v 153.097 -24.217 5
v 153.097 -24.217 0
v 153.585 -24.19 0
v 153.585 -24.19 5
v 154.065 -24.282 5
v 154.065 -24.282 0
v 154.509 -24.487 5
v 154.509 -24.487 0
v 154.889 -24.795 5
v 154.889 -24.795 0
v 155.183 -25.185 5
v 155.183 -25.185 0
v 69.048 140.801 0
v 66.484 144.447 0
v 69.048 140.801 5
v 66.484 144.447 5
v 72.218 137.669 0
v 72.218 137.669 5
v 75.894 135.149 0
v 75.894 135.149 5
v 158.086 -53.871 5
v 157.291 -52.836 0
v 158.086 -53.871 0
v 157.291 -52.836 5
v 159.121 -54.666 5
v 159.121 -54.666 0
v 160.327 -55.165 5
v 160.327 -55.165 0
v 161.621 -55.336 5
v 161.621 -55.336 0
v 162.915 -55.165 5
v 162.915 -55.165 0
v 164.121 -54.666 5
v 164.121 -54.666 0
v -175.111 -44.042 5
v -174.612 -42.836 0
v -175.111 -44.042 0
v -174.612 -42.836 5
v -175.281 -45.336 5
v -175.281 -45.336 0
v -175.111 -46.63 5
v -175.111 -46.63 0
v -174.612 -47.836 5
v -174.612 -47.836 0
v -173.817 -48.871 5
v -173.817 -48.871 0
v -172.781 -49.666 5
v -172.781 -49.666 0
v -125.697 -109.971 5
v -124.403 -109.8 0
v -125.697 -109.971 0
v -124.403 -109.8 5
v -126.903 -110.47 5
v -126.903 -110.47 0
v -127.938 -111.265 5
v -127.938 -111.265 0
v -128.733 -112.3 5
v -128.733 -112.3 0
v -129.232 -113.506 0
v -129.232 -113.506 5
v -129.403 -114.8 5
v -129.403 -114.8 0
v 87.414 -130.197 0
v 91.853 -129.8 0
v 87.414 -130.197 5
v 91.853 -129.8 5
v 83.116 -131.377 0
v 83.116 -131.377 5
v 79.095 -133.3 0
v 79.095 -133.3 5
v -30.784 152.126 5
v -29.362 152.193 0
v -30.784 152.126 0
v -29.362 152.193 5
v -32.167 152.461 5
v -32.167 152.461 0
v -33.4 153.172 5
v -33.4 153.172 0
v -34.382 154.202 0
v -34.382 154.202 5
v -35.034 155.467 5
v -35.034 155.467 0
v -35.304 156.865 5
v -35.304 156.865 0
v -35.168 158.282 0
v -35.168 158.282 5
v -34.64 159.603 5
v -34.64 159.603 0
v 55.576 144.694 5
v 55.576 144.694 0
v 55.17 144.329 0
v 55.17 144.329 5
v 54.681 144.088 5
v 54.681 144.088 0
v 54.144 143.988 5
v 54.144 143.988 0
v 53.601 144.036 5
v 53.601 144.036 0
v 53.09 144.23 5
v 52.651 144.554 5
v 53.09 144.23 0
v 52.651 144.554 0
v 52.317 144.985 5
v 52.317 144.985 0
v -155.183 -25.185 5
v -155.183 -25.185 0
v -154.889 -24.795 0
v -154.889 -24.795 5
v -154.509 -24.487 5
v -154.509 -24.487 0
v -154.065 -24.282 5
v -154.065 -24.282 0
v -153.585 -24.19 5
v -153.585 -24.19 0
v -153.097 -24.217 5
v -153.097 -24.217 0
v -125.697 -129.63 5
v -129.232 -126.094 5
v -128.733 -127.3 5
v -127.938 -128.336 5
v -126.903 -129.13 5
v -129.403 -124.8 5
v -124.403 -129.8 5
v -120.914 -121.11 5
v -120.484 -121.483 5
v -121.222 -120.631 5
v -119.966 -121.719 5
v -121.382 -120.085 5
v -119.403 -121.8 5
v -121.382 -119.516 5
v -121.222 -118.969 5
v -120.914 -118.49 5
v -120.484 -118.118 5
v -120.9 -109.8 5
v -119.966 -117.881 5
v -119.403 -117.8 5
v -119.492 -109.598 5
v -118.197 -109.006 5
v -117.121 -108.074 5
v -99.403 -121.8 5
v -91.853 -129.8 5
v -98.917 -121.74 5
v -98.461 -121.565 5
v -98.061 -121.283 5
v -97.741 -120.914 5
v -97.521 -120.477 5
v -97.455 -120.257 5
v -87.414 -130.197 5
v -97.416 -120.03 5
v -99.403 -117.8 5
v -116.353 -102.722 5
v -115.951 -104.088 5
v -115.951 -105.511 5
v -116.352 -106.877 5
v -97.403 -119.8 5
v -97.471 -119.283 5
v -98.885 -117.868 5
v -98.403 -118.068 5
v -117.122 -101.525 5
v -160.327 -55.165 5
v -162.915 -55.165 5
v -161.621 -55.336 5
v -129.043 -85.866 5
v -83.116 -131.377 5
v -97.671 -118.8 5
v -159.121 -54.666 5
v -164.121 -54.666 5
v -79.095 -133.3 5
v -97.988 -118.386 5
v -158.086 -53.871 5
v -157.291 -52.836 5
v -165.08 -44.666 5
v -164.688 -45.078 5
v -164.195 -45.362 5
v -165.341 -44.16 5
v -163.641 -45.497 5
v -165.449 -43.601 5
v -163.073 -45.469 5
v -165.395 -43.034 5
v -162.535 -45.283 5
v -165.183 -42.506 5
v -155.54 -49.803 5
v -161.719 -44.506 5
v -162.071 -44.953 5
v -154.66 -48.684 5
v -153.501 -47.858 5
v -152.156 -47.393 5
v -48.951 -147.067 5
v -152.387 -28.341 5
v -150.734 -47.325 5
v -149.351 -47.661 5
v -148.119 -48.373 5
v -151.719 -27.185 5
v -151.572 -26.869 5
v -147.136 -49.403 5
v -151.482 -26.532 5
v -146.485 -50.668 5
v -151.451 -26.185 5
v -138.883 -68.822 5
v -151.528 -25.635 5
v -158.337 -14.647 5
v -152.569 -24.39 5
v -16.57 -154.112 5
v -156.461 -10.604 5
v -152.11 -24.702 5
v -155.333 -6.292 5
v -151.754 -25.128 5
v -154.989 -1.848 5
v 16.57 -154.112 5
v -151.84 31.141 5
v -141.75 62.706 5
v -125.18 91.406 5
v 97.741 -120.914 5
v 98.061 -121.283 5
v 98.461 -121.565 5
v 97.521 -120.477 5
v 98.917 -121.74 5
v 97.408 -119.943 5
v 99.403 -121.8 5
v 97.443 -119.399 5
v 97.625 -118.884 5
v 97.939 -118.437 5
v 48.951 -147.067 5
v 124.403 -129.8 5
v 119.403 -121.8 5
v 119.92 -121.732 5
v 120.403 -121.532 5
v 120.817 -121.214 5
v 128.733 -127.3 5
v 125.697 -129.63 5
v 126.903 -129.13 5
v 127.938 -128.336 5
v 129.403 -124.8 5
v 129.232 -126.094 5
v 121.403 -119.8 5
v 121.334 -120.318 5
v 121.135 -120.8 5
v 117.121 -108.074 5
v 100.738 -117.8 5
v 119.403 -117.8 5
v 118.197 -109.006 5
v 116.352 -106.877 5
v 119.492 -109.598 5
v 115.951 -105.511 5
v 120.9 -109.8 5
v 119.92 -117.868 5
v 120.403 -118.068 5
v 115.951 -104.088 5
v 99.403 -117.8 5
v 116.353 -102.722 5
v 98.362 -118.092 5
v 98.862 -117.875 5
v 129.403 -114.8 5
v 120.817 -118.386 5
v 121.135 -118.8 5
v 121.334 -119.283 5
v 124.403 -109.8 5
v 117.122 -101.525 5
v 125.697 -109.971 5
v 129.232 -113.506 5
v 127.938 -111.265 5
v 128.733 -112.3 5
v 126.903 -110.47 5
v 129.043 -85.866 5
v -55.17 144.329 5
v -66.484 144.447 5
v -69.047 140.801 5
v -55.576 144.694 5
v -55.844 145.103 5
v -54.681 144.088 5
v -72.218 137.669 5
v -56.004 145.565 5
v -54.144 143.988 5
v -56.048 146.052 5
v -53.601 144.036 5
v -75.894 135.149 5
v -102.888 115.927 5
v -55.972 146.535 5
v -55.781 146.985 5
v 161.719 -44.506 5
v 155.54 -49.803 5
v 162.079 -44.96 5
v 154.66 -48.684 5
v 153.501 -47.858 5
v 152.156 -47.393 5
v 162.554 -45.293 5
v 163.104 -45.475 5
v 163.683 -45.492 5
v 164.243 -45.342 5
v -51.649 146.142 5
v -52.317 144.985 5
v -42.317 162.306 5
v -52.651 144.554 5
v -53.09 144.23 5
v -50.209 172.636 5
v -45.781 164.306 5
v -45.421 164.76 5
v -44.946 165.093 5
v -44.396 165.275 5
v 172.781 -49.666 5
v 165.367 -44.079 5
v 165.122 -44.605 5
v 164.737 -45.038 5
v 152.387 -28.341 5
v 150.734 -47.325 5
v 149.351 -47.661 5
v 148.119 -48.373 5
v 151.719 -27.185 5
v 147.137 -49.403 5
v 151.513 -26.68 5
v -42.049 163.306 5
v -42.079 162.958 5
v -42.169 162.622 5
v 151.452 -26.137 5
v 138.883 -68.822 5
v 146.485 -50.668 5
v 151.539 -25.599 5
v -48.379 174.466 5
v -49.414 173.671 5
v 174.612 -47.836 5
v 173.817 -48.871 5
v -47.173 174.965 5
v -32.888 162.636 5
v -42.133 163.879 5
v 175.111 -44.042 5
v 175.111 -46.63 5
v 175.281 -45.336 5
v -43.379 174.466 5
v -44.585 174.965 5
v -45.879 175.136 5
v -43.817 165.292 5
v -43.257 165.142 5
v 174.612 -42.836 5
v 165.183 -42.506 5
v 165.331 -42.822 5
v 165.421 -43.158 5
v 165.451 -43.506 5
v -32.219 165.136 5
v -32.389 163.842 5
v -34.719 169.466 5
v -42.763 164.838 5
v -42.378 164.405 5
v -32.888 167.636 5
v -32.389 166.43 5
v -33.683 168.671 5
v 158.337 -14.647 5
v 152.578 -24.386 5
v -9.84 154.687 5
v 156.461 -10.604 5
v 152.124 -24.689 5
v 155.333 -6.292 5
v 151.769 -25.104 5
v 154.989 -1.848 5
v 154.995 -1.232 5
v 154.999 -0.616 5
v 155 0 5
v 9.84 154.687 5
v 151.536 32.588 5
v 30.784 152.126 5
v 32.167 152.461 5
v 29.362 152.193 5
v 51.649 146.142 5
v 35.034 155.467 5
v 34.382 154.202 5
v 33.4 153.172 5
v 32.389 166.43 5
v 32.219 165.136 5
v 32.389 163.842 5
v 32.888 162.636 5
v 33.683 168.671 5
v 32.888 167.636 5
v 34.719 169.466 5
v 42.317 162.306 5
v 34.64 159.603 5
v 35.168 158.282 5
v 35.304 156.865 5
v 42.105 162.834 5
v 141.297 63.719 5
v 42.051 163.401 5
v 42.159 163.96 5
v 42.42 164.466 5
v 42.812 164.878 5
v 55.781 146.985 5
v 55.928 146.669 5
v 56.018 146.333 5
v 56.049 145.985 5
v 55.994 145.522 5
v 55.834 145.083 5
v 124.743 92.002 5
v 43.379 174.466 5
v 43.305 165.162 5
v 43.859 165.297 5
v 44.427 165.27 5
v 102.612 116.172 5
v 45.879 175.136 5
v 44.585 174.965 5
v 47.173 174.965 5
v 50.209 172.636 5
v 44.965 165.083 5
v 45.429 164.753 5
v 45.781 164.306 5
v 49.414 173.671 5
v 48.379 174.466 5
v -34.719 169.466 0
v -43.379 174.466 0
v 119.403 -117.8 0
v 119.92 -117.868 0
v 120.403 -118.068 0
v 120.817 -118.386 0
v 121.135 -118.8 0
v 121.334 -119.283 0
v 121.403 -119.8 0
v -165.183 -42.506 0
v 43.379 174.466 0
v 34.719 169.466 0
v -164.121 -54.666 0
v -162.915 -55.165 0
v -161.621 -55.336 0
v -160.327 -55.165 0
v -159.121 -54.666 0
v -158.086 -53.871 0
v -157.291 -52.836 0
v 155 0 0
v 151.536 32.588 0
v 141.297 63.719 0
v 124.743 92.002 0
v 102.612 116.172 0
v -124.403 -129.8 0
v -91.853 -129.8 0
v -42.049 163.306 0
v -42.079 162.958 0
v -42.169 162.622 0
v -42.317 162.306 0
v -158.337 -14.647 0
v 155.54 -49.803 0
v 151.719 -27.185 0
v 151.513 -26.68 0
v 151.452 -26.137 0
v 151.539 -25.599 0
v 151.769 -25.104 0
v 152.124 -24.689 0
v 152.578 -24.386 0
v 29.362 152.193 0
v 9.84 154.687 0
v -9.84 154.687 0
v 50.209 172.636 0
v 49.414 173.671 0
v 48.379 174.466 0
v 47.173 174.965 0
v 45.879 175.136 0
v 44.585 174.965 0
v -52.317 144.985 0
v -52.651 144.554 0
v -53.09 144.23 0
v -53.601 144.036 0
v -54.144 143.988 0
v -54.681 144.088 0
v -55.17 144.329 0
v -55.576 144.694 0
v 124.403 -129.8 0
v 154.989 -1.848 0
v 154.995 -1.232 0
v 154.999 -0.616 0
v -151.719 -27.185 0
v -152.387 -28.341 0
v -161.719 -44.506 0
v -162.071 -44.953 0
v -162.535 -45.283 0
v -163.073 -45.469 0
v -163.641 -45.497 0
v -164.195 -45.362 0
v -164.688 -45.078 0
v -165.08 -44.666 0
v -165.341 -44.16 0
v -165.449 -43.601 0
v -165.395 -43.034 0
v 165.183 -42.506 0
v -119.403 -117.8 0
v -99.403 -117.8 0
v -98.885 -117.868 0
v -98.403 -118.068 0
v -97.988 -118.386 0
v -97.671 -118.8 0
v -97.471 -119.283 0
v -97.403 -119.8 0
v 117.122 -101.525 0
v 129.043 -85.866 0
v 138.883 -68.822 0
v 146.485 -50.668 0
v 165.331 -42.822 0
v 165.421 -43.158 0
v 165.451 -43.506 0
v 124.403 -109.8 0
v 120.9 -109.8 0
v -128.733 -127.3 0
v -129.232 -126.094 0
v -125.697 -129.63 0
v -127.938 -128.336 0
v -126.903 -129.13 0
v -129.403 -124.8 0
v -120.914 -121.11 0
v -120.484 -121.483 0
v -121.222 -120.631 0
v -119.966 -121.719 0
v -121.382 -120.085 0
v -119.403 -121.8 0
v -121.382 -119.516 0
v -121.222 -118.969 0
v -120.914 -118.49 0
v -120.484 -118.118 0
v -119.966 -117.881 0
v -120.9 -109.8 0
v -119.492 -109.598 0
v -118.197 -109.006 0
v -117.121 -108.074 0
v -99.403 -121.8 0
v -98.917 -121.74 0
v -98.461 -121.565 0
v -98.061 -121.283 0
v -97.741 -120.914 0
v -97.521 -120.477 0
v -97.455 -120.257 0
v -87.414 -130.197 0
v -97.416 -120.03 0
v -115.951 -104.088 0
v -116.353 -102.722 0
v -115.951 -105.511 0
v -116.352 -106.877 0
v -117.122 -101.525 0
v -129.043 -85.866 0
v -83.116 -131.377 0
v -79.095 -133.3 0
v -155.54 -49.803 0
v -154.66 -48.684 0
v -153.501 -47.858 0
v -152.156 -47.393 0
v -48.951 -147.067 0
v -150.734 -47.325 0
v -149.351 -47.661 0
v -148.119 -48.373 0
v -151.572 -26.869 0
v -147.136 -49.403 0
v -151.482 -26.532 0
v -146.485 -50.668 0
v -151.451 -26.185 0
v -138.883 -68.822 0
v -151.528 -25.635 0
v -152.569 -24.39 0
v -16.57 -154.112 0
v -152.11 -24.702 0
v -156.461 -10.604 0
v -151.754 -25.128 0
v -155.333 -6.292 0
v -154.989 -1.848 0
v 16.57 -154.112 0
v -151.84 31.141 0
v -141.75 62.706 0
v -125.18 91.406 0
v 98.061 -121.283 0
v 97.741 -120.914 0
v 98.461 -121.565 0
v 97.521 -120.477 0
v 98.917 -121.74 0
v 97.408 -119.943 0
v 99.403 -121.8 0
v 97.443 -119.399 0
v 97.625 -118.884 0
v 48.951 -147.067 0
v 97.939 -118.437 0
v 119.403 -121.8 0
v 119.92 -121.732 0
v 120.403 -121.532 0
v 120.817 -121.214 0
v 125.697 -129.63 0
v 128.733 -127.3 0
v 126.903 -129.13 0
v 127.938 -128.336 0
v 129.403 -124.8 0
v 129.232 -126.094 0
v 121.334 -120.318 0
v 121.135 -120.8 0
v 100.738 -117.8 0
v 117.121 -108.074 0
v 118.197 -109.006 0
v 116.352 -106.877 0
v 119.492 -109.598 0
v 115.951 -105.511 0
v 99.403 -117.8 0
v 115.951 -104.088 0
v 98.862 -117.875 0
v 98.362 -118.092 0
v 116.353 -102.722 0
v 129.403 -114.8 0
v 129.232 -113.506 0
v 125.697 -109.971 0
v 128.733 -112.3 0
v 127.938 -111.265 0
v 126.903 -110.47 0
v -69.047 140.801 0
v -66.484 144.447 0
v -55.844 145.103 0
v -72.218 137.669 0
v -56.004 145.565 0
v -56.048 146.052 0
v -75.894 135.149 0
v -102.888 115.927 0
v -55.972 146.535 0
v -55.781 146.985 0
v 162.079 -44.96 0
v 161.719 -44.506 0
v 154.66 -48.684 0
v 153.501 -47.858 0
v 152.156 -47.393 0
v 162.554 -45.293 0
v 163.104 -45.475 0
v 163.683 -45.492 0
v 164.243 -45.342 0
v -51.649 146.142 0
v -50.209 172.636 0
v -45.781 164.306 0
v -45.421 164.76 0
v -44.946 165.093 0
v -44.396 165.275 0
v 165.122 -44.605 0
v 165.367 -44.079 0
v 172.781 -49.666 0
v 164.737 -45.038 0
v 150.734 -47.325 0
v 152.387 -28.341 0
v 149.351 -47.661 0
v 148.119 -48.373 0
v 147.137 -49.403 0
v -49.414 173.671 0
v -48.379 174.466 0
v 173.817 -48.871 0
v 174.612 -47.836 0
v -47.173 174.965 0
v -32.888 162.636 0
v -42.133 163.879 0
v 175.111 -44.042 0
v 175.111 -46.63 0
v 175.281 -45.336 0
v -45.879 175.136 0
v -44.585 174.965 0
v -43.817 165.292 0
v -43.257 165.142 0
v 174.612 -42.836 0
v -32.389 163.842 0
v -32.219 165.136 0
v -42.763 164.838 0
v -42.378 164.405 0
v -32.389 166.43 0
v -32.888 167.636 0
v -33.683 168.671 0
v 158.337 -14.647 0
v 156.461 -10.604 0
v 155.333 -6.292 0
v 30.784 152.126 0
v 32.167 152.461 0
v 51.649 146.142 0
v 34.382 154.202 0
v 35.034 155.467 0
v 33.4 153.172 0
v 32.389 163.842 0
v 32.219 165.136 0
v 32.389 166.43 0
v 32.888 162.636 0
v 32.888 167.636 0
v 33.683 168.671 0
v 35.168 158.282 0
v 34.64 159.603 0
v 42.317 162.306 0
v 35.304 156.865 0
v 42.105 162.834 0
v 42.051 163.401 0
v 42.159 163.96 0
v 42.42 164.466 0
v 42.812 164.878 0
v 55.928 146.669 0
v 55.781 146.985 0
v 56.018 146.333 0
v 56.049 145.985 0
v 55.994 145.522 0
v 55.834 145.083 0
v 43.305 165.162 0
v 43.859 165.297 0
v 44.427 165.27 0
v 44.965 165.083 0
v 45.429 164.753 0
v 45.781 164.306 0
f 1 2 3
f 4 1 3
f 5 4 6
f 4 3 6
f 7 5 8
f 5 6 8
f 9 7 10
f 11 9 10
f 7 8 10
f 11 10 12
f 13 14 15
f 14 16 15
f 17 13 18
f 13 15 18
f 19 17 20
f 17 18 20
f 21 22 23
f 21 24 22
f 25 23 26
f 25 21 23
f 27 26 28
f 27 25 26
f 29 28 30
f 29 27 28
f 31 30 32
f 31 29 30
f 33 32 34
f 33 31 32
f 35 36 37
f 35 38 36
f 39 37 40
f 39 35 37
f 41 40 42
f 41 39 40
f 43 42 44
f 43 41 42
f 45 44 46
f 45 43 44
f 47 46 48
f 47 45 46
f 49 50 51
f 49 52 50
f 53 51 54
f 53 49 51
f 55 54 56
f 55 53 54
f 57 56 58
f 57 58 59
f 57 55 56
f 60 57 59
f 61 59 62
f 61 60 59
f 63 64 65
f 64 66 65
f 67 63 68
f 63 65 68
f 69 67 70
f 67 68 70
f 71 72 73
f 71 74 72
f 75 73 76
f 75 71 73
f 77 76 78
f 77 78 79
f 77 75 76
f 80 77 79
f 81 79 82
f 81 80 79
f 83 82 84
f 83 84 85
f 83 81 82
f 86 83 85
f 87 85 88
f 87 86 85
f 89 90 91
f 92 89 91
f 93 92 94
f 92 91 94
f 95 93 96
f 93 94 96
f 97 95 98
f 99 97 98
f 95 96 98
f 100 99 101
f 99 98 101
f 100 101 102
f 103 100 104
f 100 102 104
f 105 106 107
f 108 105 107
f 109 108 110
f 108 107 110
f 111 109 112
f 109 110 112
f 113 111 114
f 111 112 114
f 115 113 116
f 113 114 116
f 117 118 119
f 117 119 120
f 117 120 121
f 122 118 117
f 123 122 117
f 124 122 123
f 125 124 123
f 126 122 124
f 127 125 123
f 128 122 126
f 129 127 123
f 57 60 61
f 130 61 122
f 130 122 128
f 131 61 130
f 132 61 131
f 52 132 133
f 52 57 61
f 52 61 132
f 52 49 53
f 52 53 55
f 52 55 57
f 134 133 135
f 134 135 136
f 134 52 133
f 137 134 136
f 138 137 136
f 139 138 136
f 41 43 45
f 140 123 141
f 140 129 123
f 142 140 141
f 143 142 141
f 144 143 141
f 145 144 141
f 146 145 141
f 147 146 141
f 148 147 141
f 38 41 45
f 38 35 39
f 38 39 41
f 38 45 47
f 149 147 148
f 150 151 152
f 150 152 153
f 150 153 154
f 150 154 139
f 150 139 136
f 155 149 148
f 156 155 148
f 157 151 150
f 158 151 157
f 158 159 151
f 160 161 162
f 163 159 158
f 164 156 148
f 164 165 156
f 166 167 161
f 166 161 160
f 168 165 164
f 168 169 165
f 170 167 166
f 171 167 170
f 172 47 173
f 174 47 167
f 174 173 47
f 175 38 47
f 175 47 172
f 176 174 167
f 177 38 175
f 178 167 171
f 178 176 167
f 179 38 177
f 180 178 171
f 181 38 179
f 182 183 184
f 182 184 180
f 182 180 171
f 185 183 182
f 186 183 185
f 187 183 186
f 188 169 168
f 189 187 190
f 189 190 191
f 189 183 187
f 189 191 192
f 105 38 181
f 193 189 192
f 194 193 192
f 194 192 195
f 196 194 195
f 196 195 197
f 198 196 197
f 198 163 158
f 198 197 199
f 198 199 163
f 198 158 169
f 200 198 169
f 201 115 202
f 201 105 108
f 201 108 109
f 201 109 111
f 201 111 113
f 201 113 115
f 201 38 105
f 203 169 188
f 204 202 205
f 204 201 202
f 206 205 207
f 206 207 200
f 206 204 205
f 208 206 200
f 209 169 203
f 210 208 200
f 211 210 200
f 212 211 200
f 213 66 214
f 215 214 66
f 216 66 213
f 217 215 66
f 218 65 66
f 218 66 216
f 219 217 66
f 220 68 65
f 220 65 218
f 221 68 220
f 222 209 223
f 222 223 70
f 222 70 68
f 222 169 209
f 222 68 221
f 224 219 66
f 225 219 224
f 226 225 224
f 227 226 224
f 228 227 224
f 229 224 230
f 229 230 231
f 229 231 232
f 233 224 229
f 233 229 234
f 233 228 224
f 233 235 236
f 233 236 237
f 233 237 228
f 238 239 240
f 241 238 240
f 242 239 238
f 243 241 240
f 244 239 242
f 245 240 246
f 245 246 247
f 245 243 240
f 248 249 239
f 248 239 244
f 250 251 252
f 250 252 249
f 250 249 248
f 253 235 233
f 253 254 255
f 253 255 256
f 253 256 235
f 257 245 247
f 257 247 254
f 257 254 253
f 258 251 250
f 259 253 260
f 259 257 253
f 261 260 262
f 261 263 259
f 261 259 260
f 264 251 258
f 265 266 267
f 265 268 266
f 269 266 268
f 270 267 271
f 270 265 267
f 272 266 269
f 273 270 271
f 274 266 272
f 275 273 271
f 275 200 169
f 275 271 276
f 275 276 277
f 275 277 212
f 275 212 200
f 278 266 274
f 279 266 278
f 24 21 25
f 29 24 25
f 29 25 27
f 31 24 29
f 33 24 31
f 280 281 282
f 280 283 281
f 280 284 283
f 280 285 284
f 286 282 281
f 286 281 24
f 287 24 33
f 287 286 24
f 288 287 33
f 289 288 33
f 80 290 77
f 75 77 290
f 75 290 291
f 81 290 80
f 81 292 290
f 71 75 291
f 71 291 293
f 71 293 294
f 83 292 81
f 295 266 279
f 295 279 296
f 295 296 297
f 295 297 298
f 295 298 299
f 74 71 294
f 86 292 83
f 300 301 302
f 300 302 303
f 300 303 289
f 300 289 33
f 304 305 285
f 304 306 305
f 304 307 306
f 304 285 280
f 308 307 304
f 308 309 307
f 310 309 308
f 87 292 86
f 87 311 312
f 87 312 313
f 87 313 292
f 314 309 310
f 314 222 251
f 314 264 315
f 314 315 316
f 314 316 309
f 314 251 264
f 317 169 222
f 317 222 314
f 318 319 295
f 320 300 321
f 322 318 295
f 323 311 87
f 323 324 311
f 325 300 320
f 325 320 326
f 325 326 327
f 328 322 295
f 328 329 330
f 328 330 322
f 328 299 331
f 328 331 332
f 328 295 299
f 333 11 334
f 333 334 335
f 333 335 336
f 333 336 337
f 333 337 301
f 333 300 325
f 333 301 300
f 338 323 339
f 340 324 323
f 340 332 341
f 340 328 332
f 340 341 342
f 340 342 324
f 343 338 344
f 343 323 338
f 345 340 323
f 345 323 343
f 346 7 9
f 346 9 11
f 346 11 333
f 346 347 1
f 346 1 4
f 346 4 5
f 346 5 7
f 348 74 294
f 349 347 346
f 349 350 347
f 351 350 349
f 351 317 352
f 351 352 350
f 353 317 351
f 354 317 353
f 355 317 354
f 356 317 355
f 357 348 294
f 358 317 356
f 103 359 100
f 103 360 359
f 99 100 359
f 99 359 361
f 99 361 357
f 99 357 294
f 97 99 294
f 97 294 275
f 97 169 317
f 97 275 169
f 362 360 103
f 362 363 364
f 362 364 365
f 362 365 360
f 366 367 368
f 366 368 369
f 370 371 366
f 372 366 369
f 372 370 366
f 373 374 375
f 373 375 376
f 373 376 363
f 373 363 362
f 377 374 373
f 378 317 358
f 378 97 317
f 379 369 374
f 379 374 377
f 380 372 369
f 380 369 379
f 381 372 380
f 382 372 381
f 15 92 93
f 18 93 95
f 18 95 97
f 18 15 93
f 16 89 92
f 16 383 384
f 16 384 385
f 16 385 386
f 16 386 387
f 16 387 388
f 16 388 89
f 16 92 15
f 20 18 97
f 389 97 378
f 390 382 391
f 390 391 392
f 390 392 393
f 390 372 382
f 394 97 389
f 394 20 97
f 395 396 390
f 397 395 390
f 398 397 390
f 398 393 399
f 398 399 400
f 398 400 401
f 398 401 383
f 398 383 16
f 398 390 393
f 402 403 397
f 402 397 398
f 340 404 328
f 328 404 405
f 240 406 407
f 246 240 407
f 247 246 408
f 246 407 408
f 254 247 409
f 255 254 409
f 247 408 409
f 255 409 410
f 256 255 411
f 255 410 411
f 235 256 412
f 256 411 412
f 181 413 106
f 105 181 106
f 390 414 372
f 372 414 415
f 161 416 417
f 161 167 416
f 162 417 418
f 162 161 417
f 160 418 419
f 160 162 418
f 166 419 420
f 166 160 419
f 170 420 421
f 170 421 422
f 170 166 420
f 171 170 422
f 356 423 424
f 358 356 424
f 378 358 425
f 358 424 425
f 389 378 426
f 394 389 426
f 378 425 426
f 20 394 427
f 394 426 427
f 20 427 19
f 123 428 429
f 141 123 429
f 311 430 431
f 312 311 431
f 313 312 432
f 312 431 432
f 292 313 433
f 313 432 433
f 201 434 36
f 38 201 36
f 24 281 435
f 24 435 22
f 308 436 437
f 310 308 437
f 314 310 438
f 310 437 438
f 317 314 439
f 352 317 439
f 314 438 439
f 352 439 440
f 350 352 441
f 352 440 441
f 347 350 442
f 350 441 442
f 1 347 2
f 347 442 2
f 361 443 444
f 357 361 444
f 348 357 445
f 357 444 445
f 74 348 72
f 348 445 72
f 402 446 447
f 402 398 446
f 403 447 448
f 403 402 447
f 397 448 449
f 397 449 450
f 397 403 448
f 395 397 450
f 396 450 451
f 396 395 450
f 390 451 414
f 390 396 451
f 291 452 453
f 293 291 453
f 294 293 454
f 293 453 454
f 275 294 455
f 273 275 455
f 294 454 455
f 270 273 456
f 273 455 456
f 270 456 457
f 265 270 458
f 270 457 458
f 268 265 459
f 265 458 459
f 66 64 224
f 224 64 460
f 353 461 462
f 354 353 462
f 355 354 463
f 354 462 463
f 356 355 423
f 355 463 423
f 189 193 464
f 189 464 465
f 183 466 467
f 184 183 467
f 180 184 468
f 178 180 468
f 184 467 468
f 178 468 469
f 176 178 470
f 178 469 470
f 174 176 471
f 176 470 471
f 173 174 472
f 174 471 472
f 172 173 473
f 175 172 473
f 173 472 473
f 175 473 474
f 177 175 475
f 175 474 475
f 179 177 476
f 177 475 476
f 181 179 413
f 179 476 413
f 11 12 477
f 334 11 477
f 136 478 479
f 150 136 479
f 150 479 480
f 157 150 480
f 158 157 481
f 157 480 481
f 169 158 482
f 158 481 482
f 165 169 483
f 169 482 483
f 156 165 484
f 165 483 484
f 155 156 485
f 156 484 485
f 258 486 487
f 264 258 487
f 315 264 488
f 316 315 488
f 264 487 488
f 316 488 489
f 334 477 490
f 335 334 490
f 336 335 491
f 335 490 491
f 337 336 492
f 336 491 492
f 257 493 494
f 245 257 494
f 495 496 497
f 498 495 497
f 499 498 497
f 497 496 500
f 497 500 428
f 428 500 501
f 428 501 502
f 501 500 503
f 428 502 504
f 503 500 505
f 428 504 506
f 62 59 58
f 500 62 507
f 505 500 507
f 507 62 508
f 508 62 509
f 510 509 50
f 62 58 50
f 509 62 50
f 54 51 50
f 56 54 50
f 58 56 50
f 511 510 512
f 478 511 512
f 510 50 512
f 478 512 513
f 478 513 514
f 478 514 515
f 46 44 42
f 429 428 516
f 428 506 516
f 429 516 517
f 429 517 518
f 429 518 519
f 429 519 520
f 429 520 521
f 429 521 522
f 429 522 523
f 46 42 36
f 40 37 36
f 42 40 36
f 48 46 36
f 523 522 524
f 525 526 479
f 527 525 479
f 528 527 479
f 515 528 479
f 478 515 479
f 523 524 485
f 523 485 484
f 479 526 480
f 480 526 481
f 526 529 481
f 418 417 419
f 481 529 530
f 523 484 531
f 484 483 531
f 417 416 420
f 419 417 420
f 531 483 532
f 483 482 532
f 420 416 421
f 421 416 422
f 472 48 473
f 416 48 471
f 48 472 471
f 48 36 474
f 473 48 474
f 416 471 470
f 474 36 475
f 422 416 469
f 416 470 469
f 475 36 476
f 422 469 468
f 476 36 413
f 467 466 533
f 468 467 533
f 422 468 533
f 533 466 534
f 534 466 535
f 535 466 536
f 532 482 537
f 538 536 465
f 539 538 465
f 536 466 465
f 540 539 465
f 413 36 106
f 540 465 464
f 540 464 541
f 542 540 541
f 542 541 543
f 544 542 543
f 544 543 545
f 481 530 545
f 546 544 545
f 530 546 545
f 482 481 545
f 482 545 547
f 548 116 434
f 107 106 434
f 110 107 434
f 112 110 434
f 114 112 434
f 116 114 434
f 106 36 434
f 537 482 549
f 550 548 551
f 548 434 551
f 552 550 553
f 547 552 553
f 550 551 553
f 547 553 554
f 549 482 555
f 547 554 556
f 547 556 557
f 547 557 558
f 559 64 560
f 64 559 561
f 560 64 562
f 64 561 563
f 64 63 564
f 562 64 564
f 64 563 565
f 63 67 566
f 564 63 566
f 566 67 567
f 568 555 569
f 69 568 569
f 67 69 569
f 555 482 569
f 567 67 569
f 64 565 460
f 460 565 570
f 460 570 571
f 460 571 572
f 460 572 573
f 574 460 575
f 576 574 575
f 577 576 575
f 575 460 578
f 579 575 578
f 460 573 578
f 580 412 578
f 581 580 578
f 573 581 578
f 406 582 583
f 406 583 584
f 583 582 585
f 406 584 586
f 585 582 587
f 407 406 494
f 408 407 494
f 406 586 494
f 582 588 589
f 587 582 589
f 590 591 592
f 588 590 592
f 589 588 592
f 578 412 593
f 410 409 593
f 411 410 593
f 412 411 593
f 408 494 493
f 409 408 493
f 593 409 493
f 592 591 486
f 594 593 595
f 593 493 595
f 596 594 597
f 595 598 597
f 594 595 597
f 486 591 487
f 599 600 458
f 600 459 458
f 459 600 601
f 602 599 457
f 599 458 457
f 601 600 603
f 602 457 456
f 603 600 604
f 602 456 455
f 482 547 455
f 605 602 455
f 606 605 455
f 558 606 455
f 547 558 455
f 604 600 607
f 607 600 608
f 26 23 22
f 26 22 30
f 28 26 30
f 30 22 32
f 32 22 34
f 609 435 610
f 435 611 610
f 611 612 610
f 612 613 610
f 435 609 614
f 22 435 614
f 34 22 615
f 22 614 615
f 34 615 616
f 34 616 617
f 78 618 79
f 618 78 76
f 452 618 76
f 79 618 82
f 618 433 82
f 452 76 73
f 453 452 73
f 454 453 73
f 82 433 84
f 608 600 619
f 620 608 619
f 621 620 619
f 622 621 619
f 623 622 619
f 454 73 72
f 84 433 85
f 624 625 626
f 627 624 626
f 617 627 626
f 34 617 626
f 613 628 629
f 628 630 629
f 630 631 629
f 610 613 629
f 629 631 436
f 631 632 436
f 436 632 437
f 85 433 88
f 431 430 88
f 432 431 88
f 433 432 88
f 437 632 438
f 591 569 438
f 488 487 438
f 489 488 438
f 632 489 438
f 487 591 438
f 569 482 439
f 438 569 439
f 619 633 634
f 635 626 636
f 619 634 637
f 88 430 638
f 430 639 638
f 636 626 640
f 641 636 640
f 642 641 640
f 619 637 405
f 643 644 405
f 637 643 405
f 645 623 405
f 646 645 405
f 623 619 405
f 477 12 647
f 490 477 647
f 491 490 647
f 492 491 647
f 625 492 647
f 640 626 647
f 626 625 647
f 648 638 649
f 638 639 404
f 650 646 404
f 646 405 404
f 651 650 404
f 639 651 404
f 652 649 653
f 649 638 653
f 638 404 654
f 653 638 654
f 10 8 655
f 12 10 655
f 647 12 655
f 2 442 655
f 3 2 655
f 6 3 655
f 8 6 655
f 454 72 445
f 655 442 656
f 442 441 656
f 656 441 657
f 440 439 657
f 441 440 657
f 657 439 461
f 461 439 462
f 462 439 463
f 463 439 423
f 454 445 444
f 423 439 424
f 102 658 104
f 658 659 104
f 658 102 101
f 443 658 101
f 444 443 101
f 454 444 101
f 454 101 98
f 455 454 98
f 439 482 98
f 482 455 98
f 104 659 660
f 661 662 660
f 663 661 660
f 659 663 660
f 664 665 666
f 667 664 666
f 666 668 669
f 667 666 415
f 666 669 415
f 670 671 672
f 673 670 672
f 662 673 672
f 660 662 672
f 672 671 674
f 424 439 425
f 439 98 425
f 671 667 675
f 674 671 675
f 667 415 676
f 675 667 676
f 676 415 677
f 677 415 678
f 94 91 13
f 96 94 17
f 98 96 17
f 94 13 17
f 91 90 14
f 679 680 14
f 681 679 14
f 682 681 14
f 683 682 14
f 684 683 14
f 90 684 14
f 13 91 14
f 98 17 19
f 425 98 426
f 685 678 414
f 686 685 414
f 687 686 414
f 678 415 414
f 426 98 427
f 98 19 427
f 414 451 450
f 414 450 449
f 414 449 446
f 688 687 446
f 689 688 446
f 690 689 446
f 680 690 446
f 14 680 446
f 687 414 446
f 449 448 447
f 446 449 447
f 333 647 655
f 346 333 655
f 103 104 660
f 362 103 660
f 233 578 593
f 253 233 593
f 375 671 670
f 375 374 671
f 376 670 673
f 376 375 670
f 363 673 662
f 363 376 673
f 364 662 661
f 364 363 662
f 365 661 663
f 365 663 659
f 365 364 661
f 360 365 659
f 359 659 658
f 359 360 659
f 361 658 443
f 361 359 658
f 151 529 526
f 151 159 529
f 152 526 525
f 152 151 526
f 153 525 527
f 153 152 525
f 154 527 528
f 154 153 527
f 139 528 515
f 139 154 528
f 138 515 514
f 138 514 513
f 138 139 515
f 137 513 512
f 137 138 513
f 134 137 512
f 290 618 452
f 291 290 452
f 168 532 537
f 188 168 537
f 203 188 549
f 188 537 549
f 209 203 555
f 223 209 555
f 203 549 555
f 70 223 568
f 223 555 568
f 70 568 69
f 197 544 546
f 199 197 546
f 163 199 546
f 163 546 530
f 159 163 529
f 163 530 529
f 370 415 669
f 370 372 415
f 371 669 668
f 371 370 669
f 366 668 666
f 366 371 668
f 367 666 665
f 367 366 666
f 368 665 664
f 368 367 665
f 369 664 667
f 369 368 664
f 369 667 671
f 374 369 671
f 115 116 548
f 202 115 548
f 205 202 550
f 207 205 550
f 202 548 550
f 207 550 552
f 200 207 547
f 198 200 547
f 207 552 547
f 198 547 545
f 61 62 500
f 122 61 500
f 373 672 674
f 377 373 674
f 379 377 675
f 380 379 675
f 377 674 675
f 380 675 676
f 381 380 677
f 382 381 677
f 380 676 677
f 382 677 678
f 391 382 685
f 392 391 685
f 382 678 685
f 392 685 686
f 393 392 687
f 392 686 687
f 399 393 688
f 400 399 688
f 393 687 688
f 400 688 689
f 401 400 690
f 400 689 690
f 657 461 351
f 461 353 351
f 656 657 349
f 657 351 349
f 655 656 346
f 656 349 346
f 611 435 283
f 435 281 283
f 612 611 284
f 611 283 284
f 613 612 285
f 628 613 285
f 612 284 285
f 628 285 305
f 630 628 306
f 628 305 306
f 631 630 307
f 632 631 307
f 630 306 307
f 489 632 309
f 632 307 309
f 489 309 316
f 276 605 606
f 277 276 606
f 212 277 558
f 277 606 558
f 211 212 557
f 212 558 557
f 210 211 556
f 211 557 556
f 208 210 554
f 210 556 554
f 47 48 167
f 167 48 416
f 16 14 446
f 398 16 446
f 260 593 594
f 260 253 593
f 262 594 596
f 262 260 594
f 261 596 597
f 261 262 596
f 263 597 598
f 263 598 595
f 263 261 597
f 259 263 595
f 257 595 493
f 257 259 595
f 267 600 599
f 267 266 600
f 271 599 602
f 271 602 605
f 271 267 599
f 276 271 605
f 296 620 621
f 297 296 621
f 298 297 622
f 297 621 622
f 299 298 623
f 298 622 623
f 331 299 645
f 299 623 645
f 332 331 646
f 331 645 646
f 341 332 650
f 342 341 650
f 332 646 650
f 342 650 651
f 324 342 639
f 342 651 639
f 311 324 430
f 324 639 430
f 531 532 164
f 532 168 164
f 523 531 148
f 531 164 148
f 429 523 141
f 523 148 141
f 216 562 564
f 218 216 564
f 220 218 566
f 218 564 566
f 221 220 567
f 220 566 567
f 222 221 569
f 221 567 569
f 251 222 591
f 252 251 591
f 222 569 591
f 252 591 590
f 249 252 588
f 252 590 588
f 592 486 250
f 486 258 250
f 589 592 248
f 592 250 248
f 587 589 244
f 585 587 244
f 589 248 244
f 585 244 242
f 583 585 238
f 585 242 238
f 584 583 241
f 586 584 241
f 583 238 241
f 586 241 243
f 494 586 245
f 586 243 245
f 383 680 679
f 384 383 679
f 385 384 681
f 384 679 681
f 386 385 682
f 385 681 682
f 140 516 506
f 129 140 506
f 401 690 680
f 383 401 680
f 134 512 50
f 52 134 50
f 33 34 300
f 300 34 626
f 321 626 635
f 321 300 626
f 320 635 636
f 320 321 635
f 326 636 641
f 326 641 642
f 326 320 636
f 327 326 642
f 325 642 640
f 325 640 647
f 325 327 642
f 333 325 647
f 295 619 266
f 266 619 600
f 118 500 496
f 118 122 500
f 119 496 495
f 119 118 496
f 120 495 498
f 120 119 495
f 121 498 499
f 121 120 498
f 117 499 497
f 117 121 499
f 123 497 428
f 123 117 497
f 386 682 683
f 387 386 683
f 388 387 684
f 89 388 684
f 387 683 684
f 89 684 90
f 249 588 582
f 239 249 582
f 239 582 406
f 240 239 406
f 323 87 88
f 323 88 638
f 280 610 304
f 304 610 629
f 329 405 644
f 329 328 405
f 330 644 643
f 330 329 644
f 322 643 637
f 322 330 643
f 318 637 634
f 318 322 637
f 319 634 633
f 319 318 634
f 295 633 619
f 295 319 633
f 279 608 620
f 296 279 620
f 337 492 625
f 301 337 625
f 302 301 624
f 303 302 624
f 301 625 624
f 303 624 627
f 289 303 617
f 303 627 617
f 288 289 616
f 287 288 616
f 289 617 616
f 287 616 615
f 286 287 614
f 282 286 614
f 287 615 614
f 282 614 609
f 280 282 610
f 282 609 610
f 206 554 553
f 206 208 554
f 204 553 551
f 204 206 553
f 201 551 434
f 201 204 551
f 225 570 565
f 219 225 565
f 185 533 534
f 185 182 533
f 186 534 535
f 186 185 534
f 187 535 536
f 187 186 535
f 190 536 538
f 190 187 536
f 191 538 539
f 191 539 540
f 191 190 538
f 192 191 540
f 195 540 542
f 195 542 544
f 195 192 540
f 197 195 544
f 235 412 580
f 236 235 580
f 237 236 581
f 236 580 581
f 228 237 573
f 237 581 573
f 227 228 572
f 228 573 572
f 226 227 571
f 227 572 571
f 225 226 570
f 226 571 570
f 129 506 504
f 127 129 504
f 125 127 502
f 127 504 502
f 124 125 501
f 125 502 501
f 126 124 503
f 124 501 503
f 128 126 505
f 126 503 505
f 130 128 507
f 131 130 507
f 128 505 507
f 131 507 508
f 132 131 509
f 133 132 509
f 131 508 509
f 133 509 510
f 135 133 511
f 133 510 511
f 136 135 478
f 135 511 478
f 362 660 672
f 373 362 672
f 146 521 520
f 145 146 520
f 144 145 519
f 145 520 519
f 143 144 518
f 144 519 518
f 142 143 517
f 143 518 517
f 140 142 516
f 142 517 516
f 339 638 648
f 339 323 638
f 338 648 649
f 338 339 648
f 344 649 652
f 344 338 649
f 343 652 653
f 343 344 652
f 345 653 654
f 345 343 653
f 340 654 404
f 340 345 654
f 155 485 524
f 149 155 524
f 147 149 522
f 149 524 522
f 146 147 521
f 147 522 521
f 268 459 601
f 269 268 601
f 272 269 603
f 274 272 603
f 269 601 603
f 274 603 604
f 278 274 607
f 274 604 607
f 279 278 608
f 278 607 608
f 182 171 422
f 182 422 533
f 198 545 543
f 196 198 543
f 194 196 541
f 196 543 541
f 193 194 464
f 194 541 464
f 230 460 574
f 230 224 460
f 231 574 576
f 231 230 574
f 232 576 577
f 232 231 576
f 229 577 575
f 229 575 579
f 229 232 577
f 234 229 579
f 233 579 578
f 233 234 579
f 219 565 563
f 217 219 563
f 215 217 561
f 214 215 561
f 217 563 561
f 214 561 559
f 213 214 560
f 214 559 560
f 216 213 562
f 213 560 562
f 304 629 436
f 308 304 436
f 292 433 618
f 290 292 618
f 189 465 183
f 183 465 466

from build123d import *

# Parameters (mm, degrees)
F1_DEPTH = 5
F2_R     = 5
F3_R     = 5
F4_R     = 25


# Not quite as in the source:
# - ends of sketch curves that miss each other by under 0.0002 mm in the source are joined


with BuildPart() as f1:
    # F0 (on Top) → F1 (new body)
    with BuildSketch(Plane.XY):
        with BuildLine():
            ThreePointArc((154.7685858954, -8.4666888412), (154.9421356729, -4.2349253955), (155, 0))
            ThreePointArc((155, 0), (132.0663621555, 81.1386220428), (70.0519227484, 138.2668728194))
            ThreePointArc((70.0519227484, 138.2668728194), (62.8960752724, 141.6653934994), (55.5759359282, 144.6938676852))
            ThreePointArc((55.5759359282, 144.6938676852), (53.8706420703, 143.993176318), (52.3166727987, 144.9852322827))
            Line((52.3166727987, 144.9852322827), (51.6490211362, 146.1416388839))
            ThreePointArc((51.6490211362, 146.1416388839), (46.0520817915, 148.0006951425), (40.3884712615, 149.6454856959))
            ThreePointArc((40.3884712615, 149.6454856959), (2.3057e-06, 155), (-40.3884668093, 149.6454868975))
            ThreePointArc((-40.3884668093, 149.6454868975), (-46.0520770675, 148.0006966124), (-51.6490161547, 146.1416406444))
            Line((-51.6490161547, 146.1416406445), (-52.3166688853, 144.9852321932))
            ThreePointArc((-52.3166688853, 144.9852321932), (-53.8706389409, 143.9931761584), (-55.5759330313, 144.6938687979))
            ThreePointArc((-55.5759330313, 144.6938687979), (-62.8960721537, 141.665394884), (-70.0519194288, 138.2668745012))
            ThreePointArc((-70.0519194288, 138.2668745012), (-134.2339375866, 77.5), (-154.7685855343, -8.4666954414))
            ThreePointArc((-154.7685855343, -8.4666954414), (-154.1338668835, -16.3631011587), (-153.0965326665, -24.2167645548))
            ThreePointArc((-153.0965326665, -24.2167645548), (-151.9167610651, -24.9023775772), (-151.4512795032, -26.1850518006))
            ThreePointArc((-151.4512795032, -26.1850518006), (-151.5194278506, -26.7026898908), (-151.7192286956, -27.1850518006))
            Line((-151.7192286956, -27.1850518006), (-152.3868814262, -28.3414602518))
            ThreePointArc((-152.3868814262, -28.3414602518), (-151.1984015779, -34.1180796687), (-149.7910266196, -39.845305172))
            ThreePointArc((-149.7910266196, -39.845305172), (-134.2339373892, -77.500000342), (-109.4025592509, -109.8001822829))
            ThreePointArc((-109.4025592509, -109.8001822829), (-105.1463222254, -113.8826190535), (-100.7378611443, -117.800183922))
            Line((-100.7378611443, -117.8001839221), (-99.4025592509, -117.8001839221))
            ThreePointArc((-99.4025592509, -117.8001839221), (-97.9883456885, -118.3859703597), (-97.4025592509, -119.8001839221))
            ThreePointArc((-97.4025592509, -119.8001839221), (-97.4322899717, -120.143751918), (-97.5205982187, -120.4771053897))
            ThreePointArc((-97.5205982187, -120.4771053897), (-91.2377891853, -125.3022977626), (-84.7166561444, -129.8001855612))
            ThreePointArc((-84.7166561444, -129.8001855612), (0, -155), (84.7166561444, -129.8001855612))
            ThreePointArc((84.7166561444, -129.8001855612), (91.2377891853, -125.3022977626), (97.5205982187, -120.4771053897))
            ThreePointArc((97.5205982187, -120.4771053897), (97.7664292231, -118.6499324137), (99.4025592509, -117.8001839221))
            Line((99.4025592509, -117.8001839221), (100.7378611443, -117.8001839221))
            ThreePointArc((100.7378611443, -117.800183922), (105.1463222254, -113.8826190535), (109.4025592509, -109.8001822829))
            ThreePointArc((109.4025592509, -109.8001822829), (134.233938542, -77.4999983451), (149.791027805, -39.8453007155))
            ThreePointArc((149.791027805, -39.8453007155), (151.1984026669, -34.1180748426), (152.3868823923, -28.3414550574))
            Line((152.3868823923, -28.3414550574), (151.719230036, -27.1850472546))
            ThreePointArc((151.719230036, -27.1850472546), (151.6370691989, -25.3432419871), (153.0965333673, -24.2167601241))
            ThreePointArc((153.0965333673, -24.2167601241), (154.1338674692, -16.3630956418), (154.7685858954, -8.4666888412))
        make_face()
        with BuildLine():
            ThreePointArc((55.5759359282, 144.6938676852), (62.8960752724, 141.6653934994), (70.0519227484, 138.2668728194))
            Line((70.0519227484, 138.2668728194), (47.7089766448, 176.9659938193))
            Line((47.7089766448, 176.9659938193), (30.3884705677, 166.9659949732))
            Line((30.3884705677, 166.9659949732), (40.3884712615, 149.6454856959))
            ThreePointArc((40.3884712615, 149.6454856959), (46.0520817915, 148.0006951425), (51.6490211362, 146.1416388839))
            Line((51.6490211362, 146.1416388839), (42.3166727987, 162.3057403584))
            ThreePointArc((42.3166727987, 162.3057403584), (43.0487236063, 165.037791166), (45.7807744138, 164.3057403584))
            Line((45.7807744138, 164.3057403584), (55.7807744138, 146.9852322827))
            ThreePointArc((55.7807744138, 146.9852322827), (55.9805752588, 146.5028703729), (56.0487236063, 145.9852322827))
            ThreePointArc((56.0487236063, 145.9852322827), (55.9268110169, 145.2976367053), (55.5759359282, 144.6938676852))
        make_face()
        with BuildLine():
            Line((177.1115338821, -47.1658099451), (154.7685858954, -8.4666888412))
            ThreePointArc((154.7685858954, -8.4666888412), (154.1338674692, -16.3630956418), (153.0965333673, -24.2167601241))
            ThreePointArc((153.0965333673, -24.2167601241), (154.2930861111, -24.3708356099), (155.1833316512, -25.1850472546))
            Line((155.1833316512, -25.1850472546), (165.1833316512, -42.5055553303))
            ThreePointArc((165.1833316512, -42.5055553303), (165.3831324962, -42.9879172401), (165.4512808436, -43.5055553303))
            ThreePointArc((165.4512808436, -43.5055553303), (163.9689189338, -45.4374069829), (161.719230036, -44.5055553303))
            Line((161.719230036, -44.5055553303), (152.3868823923, -28.3414550574))
            ThreePointArc((152.3868823923, -28.3414550574), (151.1984026669, -34.1180748426), (149.791027805, -39.8453007155))
            Line((149.791027805, -39.8453007155), (159.791027805, -57.1658087912))
            Line((159.791027805, -57.1658087912), (177.1115338821, -47.1658099451))
        make_face()
        with BuildLine():
            ThreePointArc((-51.6490161547, 146.1416406444), (-46.0520770675, 148.0006966124), (-40.3884668093, 149.6454868975))
            Line((-40.3884668093, 149.6454868975), (-30.3884668093, 166.9659949732))
            Line((-30.3884668093, 166.9659949732), (-47.7089725764, 176.9659936403))
            Line((-47.7089725764, 176.9659936403), (-70.0519194288, 138.2668745012))
            ThreePointArc((-70.0519194288, 138.2668745012), (-62.8960721537, 141.665394884), (-55.5759330313, 144.6938687979))
            ThreePointArc((-55.5759330313, 144.6938687979), (-56.0407757277, 145.8071514412), (-55.7807705004, 146.9852321932))
            Line((-55.7807705004, 146.9852321932), (-45.7807705004, 164.3057402689))
            ThreePointArc((-45.7807705004, 164.3057402689), (-43.5310816027, 165.2375919215), (-42.0487196929, 163.3057402689))
            ThreePointArc((-42.0487196929, 163.3057402689), (-42.1168680403, 162.7881021787), (-42.3166688853, 162.3057402689))
            Line((-42.3166688853, 162.3057402689), (-51.6490161547, 146.1416406445))
        make_face()
        with BuildLine():
            Line((129.4025592509, -109.8001822829), (109.4025592509, -109.8001822829))
            ThreePointArc((109.4025592509, -109.8001822829), (105.1463222254, -113.8826190535), (100.7378611443, -117.800183922))
            Line((100.7378611443, -117.800183922), (119.4025592509, -117.8001839221))
            ThreePointArc((119.4025592509, -117.8001839221), (120.8167728132, -118.3859703597), (121.4025592509, -119.8001839221))
            ThreePointArc((121.4025592509, -119.8001839221), (120.8167728132, -121.2143974844), (119.4025592509, -121.8001839221))
            Line((119.4025592509, -121.8001839221), (99.4025592509, -121.8001842499))
            ThreePointArc((99.4025592509, -121.8001842499), (98.2523077425, -121.4363139498), (97.5205982187, -120.4771053897))
            ThreePointArc((97.5205982187, -120.4771053897), (91.2377891853, -125.3022977626), (84.7166561444, -129.8001855612))
            Line((84.7166561444, -129.8001855612), (129.4025592509, -129.8001855612))
            Line((129.4025592509, -129.8001855612), (129.4025592509, -109.8001822829))
        make_face()
        with BuildLine():
            ThreePointArc((-153.0965326665, -24.2167645548), (-154.1338668835, -16.3631011587), (-154.7685855343, -8.4666954414))
            Line((-154.7685855343, -8.4666954414), (-177.1115323867, -47.1658145805))
            Line((-177.1115323867, -47.1658145805), (-159.7910266196, -57.1658132477))
            Line((-159.7910266196, -57.1658132477), (-149.7910266196, -39.845305172))
            ThreePointArc((-149.7910266196, -39.845305172), (-151.1984015779, -34.1180796687), (-152.3868814262, -28.3414602518))
            Line((-152.3868814262, -28.3414602518), (-161.7192286956, -44.5055598762))
            ThreePointArc((-161.7192286956, -44.5055598762), (-164.4512795032, -45.2376106838), (-165.1833303107, -42.5055598762))
            Line((-165.1833303107, -42.5055598762), (-155.1833303107, -25.1850518006))
            ThreePointArc((-155.1833303107, -25.1850518006), (-154.2930850654, -24.3708402927), (-153.0965326665, -24.2167645548))
        make_face()
        with BuildLine():
            Line((-129.4025592509, -129.8001855612), (-84.7166561444, -129.8001855612))
            ThreePointArc((-84.7166561444, -129.8001855612), (-91.2377891853, -125.3022977626), (-97.5205982187, -120.4771053897))
            ThreePointArc((-97.5205982187, -120.4771053897), (-98.2523077425, -121.4363139498), (-99.4025592509, -121.8001839221))
            Line((-99.4025592509, -121.8001839221), (-119.4025592509, -121.8001839221))
            ThreePointArc((-119.4025592509, -121.8001839221), (-121.4025592509, -119.8001839221), (-119.4025592509, -117.8001839221))
            Line((-119.4025592509, -117.8001839221), (-100.7378611443, -117.8001839221))
            ThreePointArc((-100.7378611443, -117.800183922), (-105.1463222254, -113.8826190535), (-109.4025592509, -109.8001822829))
            Line((-109.4025592509, -109.8001822829), (-129.4025592509, -109.8001822829))
            Line((-129.4025592509, -109.8001822829), (-129.4025592509, -129.8001855612))
        make_face()
    extrude(amount=F1_DEPTH)

    # F2
    f2_edges = [f1.edges().sort_by_distance(p)[0] for p in [
        (-47.708973, 176.965994, 2.5),
        (-30.388467, 166.965995, 2.5),
        (30.388471, 166.965995, 2.5),
        (47.708977, 176.965994, 2.5),
        (177.111534, -47.16581, 2.5),
        (-177.111532, -47.165815, 2.5),
        (-129.402559, -109.800182, 2.5),
        (129.402559, -109.800182, 2.5),
        (159.791028, -57.165809, 2.5),
        (129.402559, -129.800186, 2.5),
        (-129.402559, -129.800186, 2.5),
        (-159.791027, -57.165813, 2.5),
    ]]
    fillet(f2_edges, radius=F2_R)

    # F3
    f3_edges = [f1.edges().sort_by_distance(p)[0] for p in [
        (-149.791027, -39.845305, 2.5),
        (149.791028, -39.845301, 2.5),
        (40.388471, 149.645486, 2.5),
        (-40.388467, 149.645487, 2.5),
        (-109.402559, -109.800182, 2.5),
        (109.402559, -109.800182, 2.5),
    ]]
    fillet(f3_edges, radius=F3_R)

    # F4
    f4_edges = [f1.edges().sort_by_distance(p)[0] for p in [
        (-70.051919, 138.266875, 2.5),
        (-154.768586, -8.466695, 2.5),
        (70.051923, 138.266873, 2.5),
        (154.768586, -8.466689, 2.5),
        (-84.716656, -129.800186, 2.5),
        (84.716656, -129.800186, 2.5),
    ]]
    fillet(f4_edges, radius=F4_R)


solid = f1.part
